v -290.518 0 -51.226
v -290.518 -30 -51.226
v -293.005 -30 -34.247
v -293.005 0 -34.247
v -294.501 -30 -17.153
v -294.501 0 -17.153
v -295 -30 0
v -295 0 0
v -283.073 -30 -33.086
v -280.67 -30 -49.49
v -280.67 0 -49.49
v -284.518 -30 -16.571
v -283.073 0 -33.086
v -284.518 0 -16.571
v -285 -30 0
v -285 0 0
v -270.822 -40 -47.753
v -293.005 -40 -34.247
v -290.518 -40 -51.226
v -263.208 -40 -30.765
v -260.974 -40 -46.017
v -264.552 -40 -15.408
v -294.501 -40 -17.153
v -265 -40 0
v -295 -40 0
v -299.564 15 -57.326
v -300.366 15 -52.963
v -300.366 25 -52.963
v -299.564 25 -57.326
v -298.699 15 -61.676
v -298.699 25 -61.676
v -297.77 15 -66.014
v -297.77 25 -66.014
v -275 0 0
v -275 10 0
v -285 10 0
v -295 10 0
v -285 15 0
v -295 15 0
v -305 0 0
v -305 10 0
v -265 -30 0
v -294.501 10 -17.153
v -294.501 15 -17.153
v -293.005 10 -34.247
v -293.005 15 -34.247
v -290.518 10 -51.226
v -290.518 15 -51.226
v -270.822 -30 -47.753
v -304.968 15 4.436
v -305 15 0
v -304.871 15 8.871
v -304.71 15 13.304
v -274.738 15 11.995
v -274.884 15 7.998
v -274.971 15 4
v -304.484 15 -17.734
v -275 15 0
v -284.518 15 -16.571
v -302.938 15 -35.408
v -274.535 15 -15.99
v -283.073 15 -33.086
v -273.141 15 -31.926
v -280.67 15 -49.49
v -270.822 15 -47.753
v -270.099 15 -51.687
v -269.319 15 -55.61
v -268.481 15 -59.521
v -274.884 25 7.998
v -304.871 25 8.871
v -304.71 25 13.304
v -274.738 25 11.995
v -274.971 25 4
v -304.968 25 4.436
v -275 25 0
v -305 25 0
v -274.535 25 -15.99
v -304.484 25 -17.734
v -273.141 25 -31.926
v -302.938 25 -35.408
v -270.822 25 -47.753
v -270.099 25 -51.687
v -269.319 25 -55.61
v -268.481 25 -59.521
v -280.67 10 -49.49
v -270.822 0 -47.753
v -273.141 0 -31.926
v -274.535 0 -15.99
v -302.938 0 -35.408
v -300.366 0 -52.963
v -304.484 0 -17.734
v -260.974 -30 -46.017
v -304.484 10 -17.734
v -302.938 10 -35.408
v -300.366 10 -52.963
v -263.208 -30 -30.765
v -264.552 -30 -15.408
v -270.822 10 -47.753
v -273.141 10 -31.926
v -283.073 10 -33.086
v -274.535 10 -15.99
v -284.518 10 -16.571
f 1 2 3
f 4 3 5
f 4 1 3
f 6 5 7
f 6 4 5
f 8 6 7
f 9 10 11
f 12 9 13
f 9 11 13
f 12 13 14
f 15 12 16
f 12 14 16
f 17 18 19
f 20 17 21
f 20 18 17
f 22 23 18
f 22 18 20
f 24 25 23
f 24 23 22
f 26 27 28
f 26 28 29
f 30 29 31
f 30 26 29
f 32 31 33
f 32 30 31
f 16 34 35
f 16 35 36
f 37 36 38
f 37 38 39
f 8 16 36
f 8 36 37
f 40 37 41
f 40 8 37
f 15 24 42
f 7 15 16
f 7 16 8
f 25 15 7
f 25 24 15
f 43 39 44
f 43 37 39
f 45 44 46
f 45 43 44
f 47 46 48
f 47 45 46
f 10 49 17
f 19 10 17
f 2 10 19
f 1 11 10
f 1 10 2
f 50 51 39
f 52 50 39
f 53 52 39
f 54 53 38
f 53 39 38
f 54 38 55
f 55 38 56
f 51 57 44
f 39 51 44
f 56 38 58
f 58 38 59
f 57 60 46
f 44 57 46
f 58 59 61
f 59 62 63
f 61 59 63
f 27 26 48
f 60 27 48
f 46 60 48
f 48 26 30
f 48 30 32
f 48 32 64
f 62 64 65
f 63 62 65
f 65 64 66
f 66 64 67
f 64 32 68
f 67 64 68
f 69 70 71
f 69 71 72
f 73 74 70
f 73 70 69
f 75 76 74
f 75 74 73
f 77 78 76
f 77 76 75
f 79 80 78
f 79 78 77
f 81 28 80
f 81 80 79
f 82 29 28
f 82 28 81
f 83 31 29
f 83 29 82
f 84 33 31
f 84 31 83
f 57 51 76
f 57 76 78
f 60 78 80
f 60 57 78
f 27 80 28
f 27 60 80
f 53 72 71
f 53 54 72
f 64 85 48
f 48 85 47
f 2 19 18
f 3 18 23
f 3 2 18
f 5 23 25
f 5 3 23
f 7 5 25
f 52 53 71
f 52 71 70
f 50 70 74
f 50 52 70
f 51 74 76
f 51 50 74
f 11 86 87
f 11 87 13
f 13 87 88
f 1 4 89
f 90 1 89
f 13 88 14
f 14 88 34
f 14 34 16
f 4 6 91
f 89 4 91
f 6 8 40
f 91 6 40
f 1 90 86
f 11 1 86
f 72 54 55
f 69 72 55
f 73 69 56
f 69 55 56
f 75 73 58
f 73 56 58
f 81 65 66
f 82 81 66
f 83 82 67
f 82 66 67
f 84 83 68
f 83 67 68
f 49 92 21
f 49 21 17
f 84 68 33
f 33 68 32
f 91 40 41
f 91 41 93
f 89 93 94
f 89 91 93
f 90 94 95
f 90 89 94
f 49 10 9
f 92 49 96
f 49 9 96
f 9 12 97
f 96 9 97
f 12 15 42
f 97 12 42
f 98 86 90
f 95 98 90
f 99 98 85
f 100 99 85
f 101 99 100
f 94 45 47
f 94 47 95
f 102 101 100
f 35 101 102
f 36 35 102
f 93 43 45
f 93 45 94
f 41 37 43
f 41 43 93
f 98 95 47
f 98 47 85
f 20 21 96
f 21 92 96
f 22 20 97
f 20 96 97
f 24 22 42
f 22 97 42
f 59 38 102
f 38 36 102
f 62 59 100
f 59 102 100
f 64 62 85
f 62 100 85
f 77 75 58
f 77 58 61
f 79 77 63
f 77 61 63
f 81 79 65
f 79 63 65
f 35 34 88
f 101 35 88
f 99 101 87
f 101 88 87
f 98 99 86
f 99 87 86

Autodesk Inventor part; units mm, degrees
ref_plane "YZ Plane" through (0, 0, 0) normal (1, 0, 0) x (0, 1, 0)
ref_plane "XZ Plane" through (0, 0, 0) normal (0, 1, 0) x (-1, 0, 0)
ref_plane "XY Plane" through (0, 0, 0) normal (0, 0, 1) x (1, 0, 0)
sketch "Sketch1" plane through (0, 0, 0) normal (0, 1, 0) x (-1, 0, 0)
  circle A0 centre (0, 0) radius 285
  circle A1 centre (0, 0) radius 295
  circle A2 centre (0, 0) radius 275
  circle A3 centre (0, 0) radius 305
  line L0 (0, 0) -> (300.3664, -52.9627)
  line L1 (0, 0) -> (305, 0)
  point P0 (275, 0)
  point P1 (270.8221, -47.7532)
  dimension "d1" = 590
  dimension "d5" = 10
  dimension "d6" = 10
  dimension "d7" = 10
  dimension "d8" = 10
extrude "Extrusion1" add sketch "Sketch1" along normal blind 10 contours L1 A1 L0 A0 | A0 L0 A2 L1 | L1 A3 L0 A1 picked at (291.5003, -5.7176) picked at (281.3509, -10.8537) picked at (297.9408, -46.5324)
sketch "Sketch2" plane through (0, 10, 0) normal (0, 1, 0) x (1, 0, 0)
  arc A0 (-270.8221, 47.7532) -> (-275, 0) centre (0, 0) ccw projected
  line L0 (-270.8221, 47.7532) -> (-300.3664, 52.9627) projected
  arc A1 (-300.3664, 52.9627) -> (-305, 0) centre (0, 0) ccw projected
  line L1 (-305, 0) -> (-275, 0) projected
  circle A2 centre (0, 0) radius 295
  circle A3 centre (0, 0) radius 285
  point P0 (-285, 0)
  point P1 (-280.6702, 49.4897)
  point P2 (-290.5183, 51.2262)
  point P3 (-295, 0)
  dimension "d11" = 10
  dimension "d12" = 590
extrude "Extrusion2" add sketch "Sketch2" along normal blind 5 contours A3 L1 A2 L0 picked at (-291.3396, 11.2413)
sketch "Sketch3" plane through (0, 15, 0) normal (0, 1, 0) x (1, 0, 0)
  line L0 (-290.5183, 51.2262) -> (-300.3664, 52.9627) projected
  arc A0 (-300.3664, 52.9627) -> (-305, 0) centre (0, 0) ccw projected
  line L1 (-305, 0) -> (-295, 0) projected
  line L2 (-280.6702, 49.4897) -> (-290.5183, 51.2262) projected
  arc A1 (-290.5183, 51.2262) -> (-295, 0) centre (0, 0) ccw projected
  line L3 (-295, 0) -> (-285, 0) projected
  arc A2 (-280.6702, 49.4897) -> (-285, 0) centre (0, 0) ccw projected
  line L4 (-285, 0) -> (-275, 0) projected
  arc A3 (-270.8221, 47.7532) -> (-275, 0) centre (0, 0) ccw projected
  line L5 (-270.8221, 47.7532) -> (-280.6702, 49.4897) projected
  circle A4 centre (0, 0) radius 305
  circle A5 centre (0, 0) radius 275
  line L6 (0, 0) -> (-304.7097, -13.3039)
  line L7 (0, 0) -> (-297.7703, 66.0141)
  arc A6 (-300.3664, 52.9627) -> (-305, 0) centre (0, 0) ccw projected
  arc A7 (-270.8221, 47.7532) -> (-275, 0) centre (0, 0) ccw projected
  arc A8 (-290.5183, 51.2262) -> (-295, 0) centre (0, 0) ccw projected
  line L8 (-290.5183, 51.2262) -> (-300.3664, 52.9627) projected
  line L9 (-305, 0) -> (-295, 0) projected
  arc A9 (-280.6702, 49.4897) -> (-285, 0) centre (0, 0) ccw projected
  arc A10 (-290.5183, 51.2262) -> (-295, 0) centre (0, 0) ccw projected
  arc A11 (-280.6702, 49.4897) -> (-285, 0) centre (0, 0) ccw projected
  line L10 (-285, 0) -> (-275, 0) projected
  line L11 (-270.8221, 47.7532) -> (-280.6702, 49.4897) projected
  point P0 (-270.8221, 47.7532)
  point P1 (-268.4814, 59.5209)
  point P2 (-305, 0)
  point P3 (-274.7383, -11.9953)
  point P4 (-305, 0)
  point P5 (-300.3664, 52.9627)
  point P6 (-305, 0)
  point P7 (-270.8221, 47.7532)
  dimension "d23" = 2.5
  dimension "d24" = 2.5
extrude "Extrusion3" add sketch "Sketch3" along normal blind 10 contours A1 L1 A0 L0 | L0 A4 L7 A5 L5 L2 | L2 A2 L3 A1 | L5 A3 L4 A2 | L3 L4 A5 L6 A4 L1
sketch "Sketch4" plane through (0, 0, 0) normal (0, -1, 0) x (1, 0, 0)
  arc A0 (-275, 0) -> (-270.8221, -47.7532) centre (0, 0) ccw projected
  line L0 (-305, 0) -> (-275, 0) projected
  arc A1 (-305, 0) -> (-300.3664, -52.9627) centre (0, 0) ccw projected
  line L1 (-270.8221, -47.7532) -> (-300.3664, -52.9627) projected
  circle A2 centre (0, 0) radius 285
  circle A3 centre (0, 0) radius 295
  point P0 (-295, 0)
  point P1 (-290.5183, -51.2262)
  point P2 (-280.6702, -49.4897)
  point P3 (-285, 0)
  dimension "d17" = 10
  dimension "d18" = 590
extrude "Extrusion4" add sketch "Sketch4" along normal blind 30 contours A2 L1 A3 L0 picked at (-291.3396, -11.2413)
sketch "Sketch5" plane through (0, -30, 0) normal (0, -1, 0) x (1, 0, 0)
  arc A0 (-295, 0) -> (-290.5183, -51.2262) centre (0, 0) ccw projected
  line L0 (-290.5183, -51.2262) -> (-280.6702, -49.4897) projected
  arc A1 (-285, 0) -> (-280.6702, -49.4897) centre (0, 0) ccw projected
  line L1 (-285, 0) -> (-295, 0) projected
  arc A2 (-295, 0) -> (-290.5183, -51.2262) centre (0, 0) ccw projected
  line L2 (-305, 0) -> (-295, 0) projected
  arc A3 (-305, 0) -> (-300.3664, -52.9627) centre (0, 0) ccw projected
  line L3 (-290.5183, -51.2262) -> (-300.3664, -52.9627) projected
  line L4 (-270.8221, -47.7532) -> (-280.6702, -49.4897) projected
  arc A4 (-275, 0) -> (-270.8221, -47.7532) centre (0, 0) ccw projected
  line L5 (-285, 0) -> (-275, 0) projected
  arc A5 (-305, 0) -> (-300.3664, -52.9627) centre (0, 0) ccw projected
  arc A6 (-275, 0) -> (-270.8221, -47.7532) centre (0, 0) ccw projected
  arc A7 (-285, 0) -> (-280.6702, -49.4897) centre (0, 0) ccw projected
  arc A8 (-295, 0) -> (-290.5183, -51.2262) centre (0, 0) ccw projected
  line L6 (-305, 0) -> (-295, 0) projected
  line L7 (-290.5183, -51.2262) -> (-300.3664, -52.9627) projected
  arc A9 (-285, 0) -> (-280.6702, -49.4897) centre (0, 0) ccw projected
  line L8 (-270.8221, -47.7532) -> (-280.6702, -49.4897) projected
  line L9 (-285, 0) -> (-275, 0) projected
  arc A10 (-295, 0) -> (-290.5183, -51.2262) centre (0, 0) ccw projected
  circle A11 centre (0, 0) radius 265
  line L10 (0, 0) -> (-305, 0)
  line L11 (0, 0) -> (-300.3664, -52.9627)
  point P0 (-290.5183, -51.2262)
  point P1 (-260.9741, -46.0168)
  point P2 (-265, 0)
  dimension "d25" = 30
extrude "Extrusion5" add sketch "Sketch5" along normal blind 10 contours L1 A1 L0 A0 | L5 A4 L4 A1 | L10 A11 L11 A4
properties part number "Moving Caoursel base Clip"
